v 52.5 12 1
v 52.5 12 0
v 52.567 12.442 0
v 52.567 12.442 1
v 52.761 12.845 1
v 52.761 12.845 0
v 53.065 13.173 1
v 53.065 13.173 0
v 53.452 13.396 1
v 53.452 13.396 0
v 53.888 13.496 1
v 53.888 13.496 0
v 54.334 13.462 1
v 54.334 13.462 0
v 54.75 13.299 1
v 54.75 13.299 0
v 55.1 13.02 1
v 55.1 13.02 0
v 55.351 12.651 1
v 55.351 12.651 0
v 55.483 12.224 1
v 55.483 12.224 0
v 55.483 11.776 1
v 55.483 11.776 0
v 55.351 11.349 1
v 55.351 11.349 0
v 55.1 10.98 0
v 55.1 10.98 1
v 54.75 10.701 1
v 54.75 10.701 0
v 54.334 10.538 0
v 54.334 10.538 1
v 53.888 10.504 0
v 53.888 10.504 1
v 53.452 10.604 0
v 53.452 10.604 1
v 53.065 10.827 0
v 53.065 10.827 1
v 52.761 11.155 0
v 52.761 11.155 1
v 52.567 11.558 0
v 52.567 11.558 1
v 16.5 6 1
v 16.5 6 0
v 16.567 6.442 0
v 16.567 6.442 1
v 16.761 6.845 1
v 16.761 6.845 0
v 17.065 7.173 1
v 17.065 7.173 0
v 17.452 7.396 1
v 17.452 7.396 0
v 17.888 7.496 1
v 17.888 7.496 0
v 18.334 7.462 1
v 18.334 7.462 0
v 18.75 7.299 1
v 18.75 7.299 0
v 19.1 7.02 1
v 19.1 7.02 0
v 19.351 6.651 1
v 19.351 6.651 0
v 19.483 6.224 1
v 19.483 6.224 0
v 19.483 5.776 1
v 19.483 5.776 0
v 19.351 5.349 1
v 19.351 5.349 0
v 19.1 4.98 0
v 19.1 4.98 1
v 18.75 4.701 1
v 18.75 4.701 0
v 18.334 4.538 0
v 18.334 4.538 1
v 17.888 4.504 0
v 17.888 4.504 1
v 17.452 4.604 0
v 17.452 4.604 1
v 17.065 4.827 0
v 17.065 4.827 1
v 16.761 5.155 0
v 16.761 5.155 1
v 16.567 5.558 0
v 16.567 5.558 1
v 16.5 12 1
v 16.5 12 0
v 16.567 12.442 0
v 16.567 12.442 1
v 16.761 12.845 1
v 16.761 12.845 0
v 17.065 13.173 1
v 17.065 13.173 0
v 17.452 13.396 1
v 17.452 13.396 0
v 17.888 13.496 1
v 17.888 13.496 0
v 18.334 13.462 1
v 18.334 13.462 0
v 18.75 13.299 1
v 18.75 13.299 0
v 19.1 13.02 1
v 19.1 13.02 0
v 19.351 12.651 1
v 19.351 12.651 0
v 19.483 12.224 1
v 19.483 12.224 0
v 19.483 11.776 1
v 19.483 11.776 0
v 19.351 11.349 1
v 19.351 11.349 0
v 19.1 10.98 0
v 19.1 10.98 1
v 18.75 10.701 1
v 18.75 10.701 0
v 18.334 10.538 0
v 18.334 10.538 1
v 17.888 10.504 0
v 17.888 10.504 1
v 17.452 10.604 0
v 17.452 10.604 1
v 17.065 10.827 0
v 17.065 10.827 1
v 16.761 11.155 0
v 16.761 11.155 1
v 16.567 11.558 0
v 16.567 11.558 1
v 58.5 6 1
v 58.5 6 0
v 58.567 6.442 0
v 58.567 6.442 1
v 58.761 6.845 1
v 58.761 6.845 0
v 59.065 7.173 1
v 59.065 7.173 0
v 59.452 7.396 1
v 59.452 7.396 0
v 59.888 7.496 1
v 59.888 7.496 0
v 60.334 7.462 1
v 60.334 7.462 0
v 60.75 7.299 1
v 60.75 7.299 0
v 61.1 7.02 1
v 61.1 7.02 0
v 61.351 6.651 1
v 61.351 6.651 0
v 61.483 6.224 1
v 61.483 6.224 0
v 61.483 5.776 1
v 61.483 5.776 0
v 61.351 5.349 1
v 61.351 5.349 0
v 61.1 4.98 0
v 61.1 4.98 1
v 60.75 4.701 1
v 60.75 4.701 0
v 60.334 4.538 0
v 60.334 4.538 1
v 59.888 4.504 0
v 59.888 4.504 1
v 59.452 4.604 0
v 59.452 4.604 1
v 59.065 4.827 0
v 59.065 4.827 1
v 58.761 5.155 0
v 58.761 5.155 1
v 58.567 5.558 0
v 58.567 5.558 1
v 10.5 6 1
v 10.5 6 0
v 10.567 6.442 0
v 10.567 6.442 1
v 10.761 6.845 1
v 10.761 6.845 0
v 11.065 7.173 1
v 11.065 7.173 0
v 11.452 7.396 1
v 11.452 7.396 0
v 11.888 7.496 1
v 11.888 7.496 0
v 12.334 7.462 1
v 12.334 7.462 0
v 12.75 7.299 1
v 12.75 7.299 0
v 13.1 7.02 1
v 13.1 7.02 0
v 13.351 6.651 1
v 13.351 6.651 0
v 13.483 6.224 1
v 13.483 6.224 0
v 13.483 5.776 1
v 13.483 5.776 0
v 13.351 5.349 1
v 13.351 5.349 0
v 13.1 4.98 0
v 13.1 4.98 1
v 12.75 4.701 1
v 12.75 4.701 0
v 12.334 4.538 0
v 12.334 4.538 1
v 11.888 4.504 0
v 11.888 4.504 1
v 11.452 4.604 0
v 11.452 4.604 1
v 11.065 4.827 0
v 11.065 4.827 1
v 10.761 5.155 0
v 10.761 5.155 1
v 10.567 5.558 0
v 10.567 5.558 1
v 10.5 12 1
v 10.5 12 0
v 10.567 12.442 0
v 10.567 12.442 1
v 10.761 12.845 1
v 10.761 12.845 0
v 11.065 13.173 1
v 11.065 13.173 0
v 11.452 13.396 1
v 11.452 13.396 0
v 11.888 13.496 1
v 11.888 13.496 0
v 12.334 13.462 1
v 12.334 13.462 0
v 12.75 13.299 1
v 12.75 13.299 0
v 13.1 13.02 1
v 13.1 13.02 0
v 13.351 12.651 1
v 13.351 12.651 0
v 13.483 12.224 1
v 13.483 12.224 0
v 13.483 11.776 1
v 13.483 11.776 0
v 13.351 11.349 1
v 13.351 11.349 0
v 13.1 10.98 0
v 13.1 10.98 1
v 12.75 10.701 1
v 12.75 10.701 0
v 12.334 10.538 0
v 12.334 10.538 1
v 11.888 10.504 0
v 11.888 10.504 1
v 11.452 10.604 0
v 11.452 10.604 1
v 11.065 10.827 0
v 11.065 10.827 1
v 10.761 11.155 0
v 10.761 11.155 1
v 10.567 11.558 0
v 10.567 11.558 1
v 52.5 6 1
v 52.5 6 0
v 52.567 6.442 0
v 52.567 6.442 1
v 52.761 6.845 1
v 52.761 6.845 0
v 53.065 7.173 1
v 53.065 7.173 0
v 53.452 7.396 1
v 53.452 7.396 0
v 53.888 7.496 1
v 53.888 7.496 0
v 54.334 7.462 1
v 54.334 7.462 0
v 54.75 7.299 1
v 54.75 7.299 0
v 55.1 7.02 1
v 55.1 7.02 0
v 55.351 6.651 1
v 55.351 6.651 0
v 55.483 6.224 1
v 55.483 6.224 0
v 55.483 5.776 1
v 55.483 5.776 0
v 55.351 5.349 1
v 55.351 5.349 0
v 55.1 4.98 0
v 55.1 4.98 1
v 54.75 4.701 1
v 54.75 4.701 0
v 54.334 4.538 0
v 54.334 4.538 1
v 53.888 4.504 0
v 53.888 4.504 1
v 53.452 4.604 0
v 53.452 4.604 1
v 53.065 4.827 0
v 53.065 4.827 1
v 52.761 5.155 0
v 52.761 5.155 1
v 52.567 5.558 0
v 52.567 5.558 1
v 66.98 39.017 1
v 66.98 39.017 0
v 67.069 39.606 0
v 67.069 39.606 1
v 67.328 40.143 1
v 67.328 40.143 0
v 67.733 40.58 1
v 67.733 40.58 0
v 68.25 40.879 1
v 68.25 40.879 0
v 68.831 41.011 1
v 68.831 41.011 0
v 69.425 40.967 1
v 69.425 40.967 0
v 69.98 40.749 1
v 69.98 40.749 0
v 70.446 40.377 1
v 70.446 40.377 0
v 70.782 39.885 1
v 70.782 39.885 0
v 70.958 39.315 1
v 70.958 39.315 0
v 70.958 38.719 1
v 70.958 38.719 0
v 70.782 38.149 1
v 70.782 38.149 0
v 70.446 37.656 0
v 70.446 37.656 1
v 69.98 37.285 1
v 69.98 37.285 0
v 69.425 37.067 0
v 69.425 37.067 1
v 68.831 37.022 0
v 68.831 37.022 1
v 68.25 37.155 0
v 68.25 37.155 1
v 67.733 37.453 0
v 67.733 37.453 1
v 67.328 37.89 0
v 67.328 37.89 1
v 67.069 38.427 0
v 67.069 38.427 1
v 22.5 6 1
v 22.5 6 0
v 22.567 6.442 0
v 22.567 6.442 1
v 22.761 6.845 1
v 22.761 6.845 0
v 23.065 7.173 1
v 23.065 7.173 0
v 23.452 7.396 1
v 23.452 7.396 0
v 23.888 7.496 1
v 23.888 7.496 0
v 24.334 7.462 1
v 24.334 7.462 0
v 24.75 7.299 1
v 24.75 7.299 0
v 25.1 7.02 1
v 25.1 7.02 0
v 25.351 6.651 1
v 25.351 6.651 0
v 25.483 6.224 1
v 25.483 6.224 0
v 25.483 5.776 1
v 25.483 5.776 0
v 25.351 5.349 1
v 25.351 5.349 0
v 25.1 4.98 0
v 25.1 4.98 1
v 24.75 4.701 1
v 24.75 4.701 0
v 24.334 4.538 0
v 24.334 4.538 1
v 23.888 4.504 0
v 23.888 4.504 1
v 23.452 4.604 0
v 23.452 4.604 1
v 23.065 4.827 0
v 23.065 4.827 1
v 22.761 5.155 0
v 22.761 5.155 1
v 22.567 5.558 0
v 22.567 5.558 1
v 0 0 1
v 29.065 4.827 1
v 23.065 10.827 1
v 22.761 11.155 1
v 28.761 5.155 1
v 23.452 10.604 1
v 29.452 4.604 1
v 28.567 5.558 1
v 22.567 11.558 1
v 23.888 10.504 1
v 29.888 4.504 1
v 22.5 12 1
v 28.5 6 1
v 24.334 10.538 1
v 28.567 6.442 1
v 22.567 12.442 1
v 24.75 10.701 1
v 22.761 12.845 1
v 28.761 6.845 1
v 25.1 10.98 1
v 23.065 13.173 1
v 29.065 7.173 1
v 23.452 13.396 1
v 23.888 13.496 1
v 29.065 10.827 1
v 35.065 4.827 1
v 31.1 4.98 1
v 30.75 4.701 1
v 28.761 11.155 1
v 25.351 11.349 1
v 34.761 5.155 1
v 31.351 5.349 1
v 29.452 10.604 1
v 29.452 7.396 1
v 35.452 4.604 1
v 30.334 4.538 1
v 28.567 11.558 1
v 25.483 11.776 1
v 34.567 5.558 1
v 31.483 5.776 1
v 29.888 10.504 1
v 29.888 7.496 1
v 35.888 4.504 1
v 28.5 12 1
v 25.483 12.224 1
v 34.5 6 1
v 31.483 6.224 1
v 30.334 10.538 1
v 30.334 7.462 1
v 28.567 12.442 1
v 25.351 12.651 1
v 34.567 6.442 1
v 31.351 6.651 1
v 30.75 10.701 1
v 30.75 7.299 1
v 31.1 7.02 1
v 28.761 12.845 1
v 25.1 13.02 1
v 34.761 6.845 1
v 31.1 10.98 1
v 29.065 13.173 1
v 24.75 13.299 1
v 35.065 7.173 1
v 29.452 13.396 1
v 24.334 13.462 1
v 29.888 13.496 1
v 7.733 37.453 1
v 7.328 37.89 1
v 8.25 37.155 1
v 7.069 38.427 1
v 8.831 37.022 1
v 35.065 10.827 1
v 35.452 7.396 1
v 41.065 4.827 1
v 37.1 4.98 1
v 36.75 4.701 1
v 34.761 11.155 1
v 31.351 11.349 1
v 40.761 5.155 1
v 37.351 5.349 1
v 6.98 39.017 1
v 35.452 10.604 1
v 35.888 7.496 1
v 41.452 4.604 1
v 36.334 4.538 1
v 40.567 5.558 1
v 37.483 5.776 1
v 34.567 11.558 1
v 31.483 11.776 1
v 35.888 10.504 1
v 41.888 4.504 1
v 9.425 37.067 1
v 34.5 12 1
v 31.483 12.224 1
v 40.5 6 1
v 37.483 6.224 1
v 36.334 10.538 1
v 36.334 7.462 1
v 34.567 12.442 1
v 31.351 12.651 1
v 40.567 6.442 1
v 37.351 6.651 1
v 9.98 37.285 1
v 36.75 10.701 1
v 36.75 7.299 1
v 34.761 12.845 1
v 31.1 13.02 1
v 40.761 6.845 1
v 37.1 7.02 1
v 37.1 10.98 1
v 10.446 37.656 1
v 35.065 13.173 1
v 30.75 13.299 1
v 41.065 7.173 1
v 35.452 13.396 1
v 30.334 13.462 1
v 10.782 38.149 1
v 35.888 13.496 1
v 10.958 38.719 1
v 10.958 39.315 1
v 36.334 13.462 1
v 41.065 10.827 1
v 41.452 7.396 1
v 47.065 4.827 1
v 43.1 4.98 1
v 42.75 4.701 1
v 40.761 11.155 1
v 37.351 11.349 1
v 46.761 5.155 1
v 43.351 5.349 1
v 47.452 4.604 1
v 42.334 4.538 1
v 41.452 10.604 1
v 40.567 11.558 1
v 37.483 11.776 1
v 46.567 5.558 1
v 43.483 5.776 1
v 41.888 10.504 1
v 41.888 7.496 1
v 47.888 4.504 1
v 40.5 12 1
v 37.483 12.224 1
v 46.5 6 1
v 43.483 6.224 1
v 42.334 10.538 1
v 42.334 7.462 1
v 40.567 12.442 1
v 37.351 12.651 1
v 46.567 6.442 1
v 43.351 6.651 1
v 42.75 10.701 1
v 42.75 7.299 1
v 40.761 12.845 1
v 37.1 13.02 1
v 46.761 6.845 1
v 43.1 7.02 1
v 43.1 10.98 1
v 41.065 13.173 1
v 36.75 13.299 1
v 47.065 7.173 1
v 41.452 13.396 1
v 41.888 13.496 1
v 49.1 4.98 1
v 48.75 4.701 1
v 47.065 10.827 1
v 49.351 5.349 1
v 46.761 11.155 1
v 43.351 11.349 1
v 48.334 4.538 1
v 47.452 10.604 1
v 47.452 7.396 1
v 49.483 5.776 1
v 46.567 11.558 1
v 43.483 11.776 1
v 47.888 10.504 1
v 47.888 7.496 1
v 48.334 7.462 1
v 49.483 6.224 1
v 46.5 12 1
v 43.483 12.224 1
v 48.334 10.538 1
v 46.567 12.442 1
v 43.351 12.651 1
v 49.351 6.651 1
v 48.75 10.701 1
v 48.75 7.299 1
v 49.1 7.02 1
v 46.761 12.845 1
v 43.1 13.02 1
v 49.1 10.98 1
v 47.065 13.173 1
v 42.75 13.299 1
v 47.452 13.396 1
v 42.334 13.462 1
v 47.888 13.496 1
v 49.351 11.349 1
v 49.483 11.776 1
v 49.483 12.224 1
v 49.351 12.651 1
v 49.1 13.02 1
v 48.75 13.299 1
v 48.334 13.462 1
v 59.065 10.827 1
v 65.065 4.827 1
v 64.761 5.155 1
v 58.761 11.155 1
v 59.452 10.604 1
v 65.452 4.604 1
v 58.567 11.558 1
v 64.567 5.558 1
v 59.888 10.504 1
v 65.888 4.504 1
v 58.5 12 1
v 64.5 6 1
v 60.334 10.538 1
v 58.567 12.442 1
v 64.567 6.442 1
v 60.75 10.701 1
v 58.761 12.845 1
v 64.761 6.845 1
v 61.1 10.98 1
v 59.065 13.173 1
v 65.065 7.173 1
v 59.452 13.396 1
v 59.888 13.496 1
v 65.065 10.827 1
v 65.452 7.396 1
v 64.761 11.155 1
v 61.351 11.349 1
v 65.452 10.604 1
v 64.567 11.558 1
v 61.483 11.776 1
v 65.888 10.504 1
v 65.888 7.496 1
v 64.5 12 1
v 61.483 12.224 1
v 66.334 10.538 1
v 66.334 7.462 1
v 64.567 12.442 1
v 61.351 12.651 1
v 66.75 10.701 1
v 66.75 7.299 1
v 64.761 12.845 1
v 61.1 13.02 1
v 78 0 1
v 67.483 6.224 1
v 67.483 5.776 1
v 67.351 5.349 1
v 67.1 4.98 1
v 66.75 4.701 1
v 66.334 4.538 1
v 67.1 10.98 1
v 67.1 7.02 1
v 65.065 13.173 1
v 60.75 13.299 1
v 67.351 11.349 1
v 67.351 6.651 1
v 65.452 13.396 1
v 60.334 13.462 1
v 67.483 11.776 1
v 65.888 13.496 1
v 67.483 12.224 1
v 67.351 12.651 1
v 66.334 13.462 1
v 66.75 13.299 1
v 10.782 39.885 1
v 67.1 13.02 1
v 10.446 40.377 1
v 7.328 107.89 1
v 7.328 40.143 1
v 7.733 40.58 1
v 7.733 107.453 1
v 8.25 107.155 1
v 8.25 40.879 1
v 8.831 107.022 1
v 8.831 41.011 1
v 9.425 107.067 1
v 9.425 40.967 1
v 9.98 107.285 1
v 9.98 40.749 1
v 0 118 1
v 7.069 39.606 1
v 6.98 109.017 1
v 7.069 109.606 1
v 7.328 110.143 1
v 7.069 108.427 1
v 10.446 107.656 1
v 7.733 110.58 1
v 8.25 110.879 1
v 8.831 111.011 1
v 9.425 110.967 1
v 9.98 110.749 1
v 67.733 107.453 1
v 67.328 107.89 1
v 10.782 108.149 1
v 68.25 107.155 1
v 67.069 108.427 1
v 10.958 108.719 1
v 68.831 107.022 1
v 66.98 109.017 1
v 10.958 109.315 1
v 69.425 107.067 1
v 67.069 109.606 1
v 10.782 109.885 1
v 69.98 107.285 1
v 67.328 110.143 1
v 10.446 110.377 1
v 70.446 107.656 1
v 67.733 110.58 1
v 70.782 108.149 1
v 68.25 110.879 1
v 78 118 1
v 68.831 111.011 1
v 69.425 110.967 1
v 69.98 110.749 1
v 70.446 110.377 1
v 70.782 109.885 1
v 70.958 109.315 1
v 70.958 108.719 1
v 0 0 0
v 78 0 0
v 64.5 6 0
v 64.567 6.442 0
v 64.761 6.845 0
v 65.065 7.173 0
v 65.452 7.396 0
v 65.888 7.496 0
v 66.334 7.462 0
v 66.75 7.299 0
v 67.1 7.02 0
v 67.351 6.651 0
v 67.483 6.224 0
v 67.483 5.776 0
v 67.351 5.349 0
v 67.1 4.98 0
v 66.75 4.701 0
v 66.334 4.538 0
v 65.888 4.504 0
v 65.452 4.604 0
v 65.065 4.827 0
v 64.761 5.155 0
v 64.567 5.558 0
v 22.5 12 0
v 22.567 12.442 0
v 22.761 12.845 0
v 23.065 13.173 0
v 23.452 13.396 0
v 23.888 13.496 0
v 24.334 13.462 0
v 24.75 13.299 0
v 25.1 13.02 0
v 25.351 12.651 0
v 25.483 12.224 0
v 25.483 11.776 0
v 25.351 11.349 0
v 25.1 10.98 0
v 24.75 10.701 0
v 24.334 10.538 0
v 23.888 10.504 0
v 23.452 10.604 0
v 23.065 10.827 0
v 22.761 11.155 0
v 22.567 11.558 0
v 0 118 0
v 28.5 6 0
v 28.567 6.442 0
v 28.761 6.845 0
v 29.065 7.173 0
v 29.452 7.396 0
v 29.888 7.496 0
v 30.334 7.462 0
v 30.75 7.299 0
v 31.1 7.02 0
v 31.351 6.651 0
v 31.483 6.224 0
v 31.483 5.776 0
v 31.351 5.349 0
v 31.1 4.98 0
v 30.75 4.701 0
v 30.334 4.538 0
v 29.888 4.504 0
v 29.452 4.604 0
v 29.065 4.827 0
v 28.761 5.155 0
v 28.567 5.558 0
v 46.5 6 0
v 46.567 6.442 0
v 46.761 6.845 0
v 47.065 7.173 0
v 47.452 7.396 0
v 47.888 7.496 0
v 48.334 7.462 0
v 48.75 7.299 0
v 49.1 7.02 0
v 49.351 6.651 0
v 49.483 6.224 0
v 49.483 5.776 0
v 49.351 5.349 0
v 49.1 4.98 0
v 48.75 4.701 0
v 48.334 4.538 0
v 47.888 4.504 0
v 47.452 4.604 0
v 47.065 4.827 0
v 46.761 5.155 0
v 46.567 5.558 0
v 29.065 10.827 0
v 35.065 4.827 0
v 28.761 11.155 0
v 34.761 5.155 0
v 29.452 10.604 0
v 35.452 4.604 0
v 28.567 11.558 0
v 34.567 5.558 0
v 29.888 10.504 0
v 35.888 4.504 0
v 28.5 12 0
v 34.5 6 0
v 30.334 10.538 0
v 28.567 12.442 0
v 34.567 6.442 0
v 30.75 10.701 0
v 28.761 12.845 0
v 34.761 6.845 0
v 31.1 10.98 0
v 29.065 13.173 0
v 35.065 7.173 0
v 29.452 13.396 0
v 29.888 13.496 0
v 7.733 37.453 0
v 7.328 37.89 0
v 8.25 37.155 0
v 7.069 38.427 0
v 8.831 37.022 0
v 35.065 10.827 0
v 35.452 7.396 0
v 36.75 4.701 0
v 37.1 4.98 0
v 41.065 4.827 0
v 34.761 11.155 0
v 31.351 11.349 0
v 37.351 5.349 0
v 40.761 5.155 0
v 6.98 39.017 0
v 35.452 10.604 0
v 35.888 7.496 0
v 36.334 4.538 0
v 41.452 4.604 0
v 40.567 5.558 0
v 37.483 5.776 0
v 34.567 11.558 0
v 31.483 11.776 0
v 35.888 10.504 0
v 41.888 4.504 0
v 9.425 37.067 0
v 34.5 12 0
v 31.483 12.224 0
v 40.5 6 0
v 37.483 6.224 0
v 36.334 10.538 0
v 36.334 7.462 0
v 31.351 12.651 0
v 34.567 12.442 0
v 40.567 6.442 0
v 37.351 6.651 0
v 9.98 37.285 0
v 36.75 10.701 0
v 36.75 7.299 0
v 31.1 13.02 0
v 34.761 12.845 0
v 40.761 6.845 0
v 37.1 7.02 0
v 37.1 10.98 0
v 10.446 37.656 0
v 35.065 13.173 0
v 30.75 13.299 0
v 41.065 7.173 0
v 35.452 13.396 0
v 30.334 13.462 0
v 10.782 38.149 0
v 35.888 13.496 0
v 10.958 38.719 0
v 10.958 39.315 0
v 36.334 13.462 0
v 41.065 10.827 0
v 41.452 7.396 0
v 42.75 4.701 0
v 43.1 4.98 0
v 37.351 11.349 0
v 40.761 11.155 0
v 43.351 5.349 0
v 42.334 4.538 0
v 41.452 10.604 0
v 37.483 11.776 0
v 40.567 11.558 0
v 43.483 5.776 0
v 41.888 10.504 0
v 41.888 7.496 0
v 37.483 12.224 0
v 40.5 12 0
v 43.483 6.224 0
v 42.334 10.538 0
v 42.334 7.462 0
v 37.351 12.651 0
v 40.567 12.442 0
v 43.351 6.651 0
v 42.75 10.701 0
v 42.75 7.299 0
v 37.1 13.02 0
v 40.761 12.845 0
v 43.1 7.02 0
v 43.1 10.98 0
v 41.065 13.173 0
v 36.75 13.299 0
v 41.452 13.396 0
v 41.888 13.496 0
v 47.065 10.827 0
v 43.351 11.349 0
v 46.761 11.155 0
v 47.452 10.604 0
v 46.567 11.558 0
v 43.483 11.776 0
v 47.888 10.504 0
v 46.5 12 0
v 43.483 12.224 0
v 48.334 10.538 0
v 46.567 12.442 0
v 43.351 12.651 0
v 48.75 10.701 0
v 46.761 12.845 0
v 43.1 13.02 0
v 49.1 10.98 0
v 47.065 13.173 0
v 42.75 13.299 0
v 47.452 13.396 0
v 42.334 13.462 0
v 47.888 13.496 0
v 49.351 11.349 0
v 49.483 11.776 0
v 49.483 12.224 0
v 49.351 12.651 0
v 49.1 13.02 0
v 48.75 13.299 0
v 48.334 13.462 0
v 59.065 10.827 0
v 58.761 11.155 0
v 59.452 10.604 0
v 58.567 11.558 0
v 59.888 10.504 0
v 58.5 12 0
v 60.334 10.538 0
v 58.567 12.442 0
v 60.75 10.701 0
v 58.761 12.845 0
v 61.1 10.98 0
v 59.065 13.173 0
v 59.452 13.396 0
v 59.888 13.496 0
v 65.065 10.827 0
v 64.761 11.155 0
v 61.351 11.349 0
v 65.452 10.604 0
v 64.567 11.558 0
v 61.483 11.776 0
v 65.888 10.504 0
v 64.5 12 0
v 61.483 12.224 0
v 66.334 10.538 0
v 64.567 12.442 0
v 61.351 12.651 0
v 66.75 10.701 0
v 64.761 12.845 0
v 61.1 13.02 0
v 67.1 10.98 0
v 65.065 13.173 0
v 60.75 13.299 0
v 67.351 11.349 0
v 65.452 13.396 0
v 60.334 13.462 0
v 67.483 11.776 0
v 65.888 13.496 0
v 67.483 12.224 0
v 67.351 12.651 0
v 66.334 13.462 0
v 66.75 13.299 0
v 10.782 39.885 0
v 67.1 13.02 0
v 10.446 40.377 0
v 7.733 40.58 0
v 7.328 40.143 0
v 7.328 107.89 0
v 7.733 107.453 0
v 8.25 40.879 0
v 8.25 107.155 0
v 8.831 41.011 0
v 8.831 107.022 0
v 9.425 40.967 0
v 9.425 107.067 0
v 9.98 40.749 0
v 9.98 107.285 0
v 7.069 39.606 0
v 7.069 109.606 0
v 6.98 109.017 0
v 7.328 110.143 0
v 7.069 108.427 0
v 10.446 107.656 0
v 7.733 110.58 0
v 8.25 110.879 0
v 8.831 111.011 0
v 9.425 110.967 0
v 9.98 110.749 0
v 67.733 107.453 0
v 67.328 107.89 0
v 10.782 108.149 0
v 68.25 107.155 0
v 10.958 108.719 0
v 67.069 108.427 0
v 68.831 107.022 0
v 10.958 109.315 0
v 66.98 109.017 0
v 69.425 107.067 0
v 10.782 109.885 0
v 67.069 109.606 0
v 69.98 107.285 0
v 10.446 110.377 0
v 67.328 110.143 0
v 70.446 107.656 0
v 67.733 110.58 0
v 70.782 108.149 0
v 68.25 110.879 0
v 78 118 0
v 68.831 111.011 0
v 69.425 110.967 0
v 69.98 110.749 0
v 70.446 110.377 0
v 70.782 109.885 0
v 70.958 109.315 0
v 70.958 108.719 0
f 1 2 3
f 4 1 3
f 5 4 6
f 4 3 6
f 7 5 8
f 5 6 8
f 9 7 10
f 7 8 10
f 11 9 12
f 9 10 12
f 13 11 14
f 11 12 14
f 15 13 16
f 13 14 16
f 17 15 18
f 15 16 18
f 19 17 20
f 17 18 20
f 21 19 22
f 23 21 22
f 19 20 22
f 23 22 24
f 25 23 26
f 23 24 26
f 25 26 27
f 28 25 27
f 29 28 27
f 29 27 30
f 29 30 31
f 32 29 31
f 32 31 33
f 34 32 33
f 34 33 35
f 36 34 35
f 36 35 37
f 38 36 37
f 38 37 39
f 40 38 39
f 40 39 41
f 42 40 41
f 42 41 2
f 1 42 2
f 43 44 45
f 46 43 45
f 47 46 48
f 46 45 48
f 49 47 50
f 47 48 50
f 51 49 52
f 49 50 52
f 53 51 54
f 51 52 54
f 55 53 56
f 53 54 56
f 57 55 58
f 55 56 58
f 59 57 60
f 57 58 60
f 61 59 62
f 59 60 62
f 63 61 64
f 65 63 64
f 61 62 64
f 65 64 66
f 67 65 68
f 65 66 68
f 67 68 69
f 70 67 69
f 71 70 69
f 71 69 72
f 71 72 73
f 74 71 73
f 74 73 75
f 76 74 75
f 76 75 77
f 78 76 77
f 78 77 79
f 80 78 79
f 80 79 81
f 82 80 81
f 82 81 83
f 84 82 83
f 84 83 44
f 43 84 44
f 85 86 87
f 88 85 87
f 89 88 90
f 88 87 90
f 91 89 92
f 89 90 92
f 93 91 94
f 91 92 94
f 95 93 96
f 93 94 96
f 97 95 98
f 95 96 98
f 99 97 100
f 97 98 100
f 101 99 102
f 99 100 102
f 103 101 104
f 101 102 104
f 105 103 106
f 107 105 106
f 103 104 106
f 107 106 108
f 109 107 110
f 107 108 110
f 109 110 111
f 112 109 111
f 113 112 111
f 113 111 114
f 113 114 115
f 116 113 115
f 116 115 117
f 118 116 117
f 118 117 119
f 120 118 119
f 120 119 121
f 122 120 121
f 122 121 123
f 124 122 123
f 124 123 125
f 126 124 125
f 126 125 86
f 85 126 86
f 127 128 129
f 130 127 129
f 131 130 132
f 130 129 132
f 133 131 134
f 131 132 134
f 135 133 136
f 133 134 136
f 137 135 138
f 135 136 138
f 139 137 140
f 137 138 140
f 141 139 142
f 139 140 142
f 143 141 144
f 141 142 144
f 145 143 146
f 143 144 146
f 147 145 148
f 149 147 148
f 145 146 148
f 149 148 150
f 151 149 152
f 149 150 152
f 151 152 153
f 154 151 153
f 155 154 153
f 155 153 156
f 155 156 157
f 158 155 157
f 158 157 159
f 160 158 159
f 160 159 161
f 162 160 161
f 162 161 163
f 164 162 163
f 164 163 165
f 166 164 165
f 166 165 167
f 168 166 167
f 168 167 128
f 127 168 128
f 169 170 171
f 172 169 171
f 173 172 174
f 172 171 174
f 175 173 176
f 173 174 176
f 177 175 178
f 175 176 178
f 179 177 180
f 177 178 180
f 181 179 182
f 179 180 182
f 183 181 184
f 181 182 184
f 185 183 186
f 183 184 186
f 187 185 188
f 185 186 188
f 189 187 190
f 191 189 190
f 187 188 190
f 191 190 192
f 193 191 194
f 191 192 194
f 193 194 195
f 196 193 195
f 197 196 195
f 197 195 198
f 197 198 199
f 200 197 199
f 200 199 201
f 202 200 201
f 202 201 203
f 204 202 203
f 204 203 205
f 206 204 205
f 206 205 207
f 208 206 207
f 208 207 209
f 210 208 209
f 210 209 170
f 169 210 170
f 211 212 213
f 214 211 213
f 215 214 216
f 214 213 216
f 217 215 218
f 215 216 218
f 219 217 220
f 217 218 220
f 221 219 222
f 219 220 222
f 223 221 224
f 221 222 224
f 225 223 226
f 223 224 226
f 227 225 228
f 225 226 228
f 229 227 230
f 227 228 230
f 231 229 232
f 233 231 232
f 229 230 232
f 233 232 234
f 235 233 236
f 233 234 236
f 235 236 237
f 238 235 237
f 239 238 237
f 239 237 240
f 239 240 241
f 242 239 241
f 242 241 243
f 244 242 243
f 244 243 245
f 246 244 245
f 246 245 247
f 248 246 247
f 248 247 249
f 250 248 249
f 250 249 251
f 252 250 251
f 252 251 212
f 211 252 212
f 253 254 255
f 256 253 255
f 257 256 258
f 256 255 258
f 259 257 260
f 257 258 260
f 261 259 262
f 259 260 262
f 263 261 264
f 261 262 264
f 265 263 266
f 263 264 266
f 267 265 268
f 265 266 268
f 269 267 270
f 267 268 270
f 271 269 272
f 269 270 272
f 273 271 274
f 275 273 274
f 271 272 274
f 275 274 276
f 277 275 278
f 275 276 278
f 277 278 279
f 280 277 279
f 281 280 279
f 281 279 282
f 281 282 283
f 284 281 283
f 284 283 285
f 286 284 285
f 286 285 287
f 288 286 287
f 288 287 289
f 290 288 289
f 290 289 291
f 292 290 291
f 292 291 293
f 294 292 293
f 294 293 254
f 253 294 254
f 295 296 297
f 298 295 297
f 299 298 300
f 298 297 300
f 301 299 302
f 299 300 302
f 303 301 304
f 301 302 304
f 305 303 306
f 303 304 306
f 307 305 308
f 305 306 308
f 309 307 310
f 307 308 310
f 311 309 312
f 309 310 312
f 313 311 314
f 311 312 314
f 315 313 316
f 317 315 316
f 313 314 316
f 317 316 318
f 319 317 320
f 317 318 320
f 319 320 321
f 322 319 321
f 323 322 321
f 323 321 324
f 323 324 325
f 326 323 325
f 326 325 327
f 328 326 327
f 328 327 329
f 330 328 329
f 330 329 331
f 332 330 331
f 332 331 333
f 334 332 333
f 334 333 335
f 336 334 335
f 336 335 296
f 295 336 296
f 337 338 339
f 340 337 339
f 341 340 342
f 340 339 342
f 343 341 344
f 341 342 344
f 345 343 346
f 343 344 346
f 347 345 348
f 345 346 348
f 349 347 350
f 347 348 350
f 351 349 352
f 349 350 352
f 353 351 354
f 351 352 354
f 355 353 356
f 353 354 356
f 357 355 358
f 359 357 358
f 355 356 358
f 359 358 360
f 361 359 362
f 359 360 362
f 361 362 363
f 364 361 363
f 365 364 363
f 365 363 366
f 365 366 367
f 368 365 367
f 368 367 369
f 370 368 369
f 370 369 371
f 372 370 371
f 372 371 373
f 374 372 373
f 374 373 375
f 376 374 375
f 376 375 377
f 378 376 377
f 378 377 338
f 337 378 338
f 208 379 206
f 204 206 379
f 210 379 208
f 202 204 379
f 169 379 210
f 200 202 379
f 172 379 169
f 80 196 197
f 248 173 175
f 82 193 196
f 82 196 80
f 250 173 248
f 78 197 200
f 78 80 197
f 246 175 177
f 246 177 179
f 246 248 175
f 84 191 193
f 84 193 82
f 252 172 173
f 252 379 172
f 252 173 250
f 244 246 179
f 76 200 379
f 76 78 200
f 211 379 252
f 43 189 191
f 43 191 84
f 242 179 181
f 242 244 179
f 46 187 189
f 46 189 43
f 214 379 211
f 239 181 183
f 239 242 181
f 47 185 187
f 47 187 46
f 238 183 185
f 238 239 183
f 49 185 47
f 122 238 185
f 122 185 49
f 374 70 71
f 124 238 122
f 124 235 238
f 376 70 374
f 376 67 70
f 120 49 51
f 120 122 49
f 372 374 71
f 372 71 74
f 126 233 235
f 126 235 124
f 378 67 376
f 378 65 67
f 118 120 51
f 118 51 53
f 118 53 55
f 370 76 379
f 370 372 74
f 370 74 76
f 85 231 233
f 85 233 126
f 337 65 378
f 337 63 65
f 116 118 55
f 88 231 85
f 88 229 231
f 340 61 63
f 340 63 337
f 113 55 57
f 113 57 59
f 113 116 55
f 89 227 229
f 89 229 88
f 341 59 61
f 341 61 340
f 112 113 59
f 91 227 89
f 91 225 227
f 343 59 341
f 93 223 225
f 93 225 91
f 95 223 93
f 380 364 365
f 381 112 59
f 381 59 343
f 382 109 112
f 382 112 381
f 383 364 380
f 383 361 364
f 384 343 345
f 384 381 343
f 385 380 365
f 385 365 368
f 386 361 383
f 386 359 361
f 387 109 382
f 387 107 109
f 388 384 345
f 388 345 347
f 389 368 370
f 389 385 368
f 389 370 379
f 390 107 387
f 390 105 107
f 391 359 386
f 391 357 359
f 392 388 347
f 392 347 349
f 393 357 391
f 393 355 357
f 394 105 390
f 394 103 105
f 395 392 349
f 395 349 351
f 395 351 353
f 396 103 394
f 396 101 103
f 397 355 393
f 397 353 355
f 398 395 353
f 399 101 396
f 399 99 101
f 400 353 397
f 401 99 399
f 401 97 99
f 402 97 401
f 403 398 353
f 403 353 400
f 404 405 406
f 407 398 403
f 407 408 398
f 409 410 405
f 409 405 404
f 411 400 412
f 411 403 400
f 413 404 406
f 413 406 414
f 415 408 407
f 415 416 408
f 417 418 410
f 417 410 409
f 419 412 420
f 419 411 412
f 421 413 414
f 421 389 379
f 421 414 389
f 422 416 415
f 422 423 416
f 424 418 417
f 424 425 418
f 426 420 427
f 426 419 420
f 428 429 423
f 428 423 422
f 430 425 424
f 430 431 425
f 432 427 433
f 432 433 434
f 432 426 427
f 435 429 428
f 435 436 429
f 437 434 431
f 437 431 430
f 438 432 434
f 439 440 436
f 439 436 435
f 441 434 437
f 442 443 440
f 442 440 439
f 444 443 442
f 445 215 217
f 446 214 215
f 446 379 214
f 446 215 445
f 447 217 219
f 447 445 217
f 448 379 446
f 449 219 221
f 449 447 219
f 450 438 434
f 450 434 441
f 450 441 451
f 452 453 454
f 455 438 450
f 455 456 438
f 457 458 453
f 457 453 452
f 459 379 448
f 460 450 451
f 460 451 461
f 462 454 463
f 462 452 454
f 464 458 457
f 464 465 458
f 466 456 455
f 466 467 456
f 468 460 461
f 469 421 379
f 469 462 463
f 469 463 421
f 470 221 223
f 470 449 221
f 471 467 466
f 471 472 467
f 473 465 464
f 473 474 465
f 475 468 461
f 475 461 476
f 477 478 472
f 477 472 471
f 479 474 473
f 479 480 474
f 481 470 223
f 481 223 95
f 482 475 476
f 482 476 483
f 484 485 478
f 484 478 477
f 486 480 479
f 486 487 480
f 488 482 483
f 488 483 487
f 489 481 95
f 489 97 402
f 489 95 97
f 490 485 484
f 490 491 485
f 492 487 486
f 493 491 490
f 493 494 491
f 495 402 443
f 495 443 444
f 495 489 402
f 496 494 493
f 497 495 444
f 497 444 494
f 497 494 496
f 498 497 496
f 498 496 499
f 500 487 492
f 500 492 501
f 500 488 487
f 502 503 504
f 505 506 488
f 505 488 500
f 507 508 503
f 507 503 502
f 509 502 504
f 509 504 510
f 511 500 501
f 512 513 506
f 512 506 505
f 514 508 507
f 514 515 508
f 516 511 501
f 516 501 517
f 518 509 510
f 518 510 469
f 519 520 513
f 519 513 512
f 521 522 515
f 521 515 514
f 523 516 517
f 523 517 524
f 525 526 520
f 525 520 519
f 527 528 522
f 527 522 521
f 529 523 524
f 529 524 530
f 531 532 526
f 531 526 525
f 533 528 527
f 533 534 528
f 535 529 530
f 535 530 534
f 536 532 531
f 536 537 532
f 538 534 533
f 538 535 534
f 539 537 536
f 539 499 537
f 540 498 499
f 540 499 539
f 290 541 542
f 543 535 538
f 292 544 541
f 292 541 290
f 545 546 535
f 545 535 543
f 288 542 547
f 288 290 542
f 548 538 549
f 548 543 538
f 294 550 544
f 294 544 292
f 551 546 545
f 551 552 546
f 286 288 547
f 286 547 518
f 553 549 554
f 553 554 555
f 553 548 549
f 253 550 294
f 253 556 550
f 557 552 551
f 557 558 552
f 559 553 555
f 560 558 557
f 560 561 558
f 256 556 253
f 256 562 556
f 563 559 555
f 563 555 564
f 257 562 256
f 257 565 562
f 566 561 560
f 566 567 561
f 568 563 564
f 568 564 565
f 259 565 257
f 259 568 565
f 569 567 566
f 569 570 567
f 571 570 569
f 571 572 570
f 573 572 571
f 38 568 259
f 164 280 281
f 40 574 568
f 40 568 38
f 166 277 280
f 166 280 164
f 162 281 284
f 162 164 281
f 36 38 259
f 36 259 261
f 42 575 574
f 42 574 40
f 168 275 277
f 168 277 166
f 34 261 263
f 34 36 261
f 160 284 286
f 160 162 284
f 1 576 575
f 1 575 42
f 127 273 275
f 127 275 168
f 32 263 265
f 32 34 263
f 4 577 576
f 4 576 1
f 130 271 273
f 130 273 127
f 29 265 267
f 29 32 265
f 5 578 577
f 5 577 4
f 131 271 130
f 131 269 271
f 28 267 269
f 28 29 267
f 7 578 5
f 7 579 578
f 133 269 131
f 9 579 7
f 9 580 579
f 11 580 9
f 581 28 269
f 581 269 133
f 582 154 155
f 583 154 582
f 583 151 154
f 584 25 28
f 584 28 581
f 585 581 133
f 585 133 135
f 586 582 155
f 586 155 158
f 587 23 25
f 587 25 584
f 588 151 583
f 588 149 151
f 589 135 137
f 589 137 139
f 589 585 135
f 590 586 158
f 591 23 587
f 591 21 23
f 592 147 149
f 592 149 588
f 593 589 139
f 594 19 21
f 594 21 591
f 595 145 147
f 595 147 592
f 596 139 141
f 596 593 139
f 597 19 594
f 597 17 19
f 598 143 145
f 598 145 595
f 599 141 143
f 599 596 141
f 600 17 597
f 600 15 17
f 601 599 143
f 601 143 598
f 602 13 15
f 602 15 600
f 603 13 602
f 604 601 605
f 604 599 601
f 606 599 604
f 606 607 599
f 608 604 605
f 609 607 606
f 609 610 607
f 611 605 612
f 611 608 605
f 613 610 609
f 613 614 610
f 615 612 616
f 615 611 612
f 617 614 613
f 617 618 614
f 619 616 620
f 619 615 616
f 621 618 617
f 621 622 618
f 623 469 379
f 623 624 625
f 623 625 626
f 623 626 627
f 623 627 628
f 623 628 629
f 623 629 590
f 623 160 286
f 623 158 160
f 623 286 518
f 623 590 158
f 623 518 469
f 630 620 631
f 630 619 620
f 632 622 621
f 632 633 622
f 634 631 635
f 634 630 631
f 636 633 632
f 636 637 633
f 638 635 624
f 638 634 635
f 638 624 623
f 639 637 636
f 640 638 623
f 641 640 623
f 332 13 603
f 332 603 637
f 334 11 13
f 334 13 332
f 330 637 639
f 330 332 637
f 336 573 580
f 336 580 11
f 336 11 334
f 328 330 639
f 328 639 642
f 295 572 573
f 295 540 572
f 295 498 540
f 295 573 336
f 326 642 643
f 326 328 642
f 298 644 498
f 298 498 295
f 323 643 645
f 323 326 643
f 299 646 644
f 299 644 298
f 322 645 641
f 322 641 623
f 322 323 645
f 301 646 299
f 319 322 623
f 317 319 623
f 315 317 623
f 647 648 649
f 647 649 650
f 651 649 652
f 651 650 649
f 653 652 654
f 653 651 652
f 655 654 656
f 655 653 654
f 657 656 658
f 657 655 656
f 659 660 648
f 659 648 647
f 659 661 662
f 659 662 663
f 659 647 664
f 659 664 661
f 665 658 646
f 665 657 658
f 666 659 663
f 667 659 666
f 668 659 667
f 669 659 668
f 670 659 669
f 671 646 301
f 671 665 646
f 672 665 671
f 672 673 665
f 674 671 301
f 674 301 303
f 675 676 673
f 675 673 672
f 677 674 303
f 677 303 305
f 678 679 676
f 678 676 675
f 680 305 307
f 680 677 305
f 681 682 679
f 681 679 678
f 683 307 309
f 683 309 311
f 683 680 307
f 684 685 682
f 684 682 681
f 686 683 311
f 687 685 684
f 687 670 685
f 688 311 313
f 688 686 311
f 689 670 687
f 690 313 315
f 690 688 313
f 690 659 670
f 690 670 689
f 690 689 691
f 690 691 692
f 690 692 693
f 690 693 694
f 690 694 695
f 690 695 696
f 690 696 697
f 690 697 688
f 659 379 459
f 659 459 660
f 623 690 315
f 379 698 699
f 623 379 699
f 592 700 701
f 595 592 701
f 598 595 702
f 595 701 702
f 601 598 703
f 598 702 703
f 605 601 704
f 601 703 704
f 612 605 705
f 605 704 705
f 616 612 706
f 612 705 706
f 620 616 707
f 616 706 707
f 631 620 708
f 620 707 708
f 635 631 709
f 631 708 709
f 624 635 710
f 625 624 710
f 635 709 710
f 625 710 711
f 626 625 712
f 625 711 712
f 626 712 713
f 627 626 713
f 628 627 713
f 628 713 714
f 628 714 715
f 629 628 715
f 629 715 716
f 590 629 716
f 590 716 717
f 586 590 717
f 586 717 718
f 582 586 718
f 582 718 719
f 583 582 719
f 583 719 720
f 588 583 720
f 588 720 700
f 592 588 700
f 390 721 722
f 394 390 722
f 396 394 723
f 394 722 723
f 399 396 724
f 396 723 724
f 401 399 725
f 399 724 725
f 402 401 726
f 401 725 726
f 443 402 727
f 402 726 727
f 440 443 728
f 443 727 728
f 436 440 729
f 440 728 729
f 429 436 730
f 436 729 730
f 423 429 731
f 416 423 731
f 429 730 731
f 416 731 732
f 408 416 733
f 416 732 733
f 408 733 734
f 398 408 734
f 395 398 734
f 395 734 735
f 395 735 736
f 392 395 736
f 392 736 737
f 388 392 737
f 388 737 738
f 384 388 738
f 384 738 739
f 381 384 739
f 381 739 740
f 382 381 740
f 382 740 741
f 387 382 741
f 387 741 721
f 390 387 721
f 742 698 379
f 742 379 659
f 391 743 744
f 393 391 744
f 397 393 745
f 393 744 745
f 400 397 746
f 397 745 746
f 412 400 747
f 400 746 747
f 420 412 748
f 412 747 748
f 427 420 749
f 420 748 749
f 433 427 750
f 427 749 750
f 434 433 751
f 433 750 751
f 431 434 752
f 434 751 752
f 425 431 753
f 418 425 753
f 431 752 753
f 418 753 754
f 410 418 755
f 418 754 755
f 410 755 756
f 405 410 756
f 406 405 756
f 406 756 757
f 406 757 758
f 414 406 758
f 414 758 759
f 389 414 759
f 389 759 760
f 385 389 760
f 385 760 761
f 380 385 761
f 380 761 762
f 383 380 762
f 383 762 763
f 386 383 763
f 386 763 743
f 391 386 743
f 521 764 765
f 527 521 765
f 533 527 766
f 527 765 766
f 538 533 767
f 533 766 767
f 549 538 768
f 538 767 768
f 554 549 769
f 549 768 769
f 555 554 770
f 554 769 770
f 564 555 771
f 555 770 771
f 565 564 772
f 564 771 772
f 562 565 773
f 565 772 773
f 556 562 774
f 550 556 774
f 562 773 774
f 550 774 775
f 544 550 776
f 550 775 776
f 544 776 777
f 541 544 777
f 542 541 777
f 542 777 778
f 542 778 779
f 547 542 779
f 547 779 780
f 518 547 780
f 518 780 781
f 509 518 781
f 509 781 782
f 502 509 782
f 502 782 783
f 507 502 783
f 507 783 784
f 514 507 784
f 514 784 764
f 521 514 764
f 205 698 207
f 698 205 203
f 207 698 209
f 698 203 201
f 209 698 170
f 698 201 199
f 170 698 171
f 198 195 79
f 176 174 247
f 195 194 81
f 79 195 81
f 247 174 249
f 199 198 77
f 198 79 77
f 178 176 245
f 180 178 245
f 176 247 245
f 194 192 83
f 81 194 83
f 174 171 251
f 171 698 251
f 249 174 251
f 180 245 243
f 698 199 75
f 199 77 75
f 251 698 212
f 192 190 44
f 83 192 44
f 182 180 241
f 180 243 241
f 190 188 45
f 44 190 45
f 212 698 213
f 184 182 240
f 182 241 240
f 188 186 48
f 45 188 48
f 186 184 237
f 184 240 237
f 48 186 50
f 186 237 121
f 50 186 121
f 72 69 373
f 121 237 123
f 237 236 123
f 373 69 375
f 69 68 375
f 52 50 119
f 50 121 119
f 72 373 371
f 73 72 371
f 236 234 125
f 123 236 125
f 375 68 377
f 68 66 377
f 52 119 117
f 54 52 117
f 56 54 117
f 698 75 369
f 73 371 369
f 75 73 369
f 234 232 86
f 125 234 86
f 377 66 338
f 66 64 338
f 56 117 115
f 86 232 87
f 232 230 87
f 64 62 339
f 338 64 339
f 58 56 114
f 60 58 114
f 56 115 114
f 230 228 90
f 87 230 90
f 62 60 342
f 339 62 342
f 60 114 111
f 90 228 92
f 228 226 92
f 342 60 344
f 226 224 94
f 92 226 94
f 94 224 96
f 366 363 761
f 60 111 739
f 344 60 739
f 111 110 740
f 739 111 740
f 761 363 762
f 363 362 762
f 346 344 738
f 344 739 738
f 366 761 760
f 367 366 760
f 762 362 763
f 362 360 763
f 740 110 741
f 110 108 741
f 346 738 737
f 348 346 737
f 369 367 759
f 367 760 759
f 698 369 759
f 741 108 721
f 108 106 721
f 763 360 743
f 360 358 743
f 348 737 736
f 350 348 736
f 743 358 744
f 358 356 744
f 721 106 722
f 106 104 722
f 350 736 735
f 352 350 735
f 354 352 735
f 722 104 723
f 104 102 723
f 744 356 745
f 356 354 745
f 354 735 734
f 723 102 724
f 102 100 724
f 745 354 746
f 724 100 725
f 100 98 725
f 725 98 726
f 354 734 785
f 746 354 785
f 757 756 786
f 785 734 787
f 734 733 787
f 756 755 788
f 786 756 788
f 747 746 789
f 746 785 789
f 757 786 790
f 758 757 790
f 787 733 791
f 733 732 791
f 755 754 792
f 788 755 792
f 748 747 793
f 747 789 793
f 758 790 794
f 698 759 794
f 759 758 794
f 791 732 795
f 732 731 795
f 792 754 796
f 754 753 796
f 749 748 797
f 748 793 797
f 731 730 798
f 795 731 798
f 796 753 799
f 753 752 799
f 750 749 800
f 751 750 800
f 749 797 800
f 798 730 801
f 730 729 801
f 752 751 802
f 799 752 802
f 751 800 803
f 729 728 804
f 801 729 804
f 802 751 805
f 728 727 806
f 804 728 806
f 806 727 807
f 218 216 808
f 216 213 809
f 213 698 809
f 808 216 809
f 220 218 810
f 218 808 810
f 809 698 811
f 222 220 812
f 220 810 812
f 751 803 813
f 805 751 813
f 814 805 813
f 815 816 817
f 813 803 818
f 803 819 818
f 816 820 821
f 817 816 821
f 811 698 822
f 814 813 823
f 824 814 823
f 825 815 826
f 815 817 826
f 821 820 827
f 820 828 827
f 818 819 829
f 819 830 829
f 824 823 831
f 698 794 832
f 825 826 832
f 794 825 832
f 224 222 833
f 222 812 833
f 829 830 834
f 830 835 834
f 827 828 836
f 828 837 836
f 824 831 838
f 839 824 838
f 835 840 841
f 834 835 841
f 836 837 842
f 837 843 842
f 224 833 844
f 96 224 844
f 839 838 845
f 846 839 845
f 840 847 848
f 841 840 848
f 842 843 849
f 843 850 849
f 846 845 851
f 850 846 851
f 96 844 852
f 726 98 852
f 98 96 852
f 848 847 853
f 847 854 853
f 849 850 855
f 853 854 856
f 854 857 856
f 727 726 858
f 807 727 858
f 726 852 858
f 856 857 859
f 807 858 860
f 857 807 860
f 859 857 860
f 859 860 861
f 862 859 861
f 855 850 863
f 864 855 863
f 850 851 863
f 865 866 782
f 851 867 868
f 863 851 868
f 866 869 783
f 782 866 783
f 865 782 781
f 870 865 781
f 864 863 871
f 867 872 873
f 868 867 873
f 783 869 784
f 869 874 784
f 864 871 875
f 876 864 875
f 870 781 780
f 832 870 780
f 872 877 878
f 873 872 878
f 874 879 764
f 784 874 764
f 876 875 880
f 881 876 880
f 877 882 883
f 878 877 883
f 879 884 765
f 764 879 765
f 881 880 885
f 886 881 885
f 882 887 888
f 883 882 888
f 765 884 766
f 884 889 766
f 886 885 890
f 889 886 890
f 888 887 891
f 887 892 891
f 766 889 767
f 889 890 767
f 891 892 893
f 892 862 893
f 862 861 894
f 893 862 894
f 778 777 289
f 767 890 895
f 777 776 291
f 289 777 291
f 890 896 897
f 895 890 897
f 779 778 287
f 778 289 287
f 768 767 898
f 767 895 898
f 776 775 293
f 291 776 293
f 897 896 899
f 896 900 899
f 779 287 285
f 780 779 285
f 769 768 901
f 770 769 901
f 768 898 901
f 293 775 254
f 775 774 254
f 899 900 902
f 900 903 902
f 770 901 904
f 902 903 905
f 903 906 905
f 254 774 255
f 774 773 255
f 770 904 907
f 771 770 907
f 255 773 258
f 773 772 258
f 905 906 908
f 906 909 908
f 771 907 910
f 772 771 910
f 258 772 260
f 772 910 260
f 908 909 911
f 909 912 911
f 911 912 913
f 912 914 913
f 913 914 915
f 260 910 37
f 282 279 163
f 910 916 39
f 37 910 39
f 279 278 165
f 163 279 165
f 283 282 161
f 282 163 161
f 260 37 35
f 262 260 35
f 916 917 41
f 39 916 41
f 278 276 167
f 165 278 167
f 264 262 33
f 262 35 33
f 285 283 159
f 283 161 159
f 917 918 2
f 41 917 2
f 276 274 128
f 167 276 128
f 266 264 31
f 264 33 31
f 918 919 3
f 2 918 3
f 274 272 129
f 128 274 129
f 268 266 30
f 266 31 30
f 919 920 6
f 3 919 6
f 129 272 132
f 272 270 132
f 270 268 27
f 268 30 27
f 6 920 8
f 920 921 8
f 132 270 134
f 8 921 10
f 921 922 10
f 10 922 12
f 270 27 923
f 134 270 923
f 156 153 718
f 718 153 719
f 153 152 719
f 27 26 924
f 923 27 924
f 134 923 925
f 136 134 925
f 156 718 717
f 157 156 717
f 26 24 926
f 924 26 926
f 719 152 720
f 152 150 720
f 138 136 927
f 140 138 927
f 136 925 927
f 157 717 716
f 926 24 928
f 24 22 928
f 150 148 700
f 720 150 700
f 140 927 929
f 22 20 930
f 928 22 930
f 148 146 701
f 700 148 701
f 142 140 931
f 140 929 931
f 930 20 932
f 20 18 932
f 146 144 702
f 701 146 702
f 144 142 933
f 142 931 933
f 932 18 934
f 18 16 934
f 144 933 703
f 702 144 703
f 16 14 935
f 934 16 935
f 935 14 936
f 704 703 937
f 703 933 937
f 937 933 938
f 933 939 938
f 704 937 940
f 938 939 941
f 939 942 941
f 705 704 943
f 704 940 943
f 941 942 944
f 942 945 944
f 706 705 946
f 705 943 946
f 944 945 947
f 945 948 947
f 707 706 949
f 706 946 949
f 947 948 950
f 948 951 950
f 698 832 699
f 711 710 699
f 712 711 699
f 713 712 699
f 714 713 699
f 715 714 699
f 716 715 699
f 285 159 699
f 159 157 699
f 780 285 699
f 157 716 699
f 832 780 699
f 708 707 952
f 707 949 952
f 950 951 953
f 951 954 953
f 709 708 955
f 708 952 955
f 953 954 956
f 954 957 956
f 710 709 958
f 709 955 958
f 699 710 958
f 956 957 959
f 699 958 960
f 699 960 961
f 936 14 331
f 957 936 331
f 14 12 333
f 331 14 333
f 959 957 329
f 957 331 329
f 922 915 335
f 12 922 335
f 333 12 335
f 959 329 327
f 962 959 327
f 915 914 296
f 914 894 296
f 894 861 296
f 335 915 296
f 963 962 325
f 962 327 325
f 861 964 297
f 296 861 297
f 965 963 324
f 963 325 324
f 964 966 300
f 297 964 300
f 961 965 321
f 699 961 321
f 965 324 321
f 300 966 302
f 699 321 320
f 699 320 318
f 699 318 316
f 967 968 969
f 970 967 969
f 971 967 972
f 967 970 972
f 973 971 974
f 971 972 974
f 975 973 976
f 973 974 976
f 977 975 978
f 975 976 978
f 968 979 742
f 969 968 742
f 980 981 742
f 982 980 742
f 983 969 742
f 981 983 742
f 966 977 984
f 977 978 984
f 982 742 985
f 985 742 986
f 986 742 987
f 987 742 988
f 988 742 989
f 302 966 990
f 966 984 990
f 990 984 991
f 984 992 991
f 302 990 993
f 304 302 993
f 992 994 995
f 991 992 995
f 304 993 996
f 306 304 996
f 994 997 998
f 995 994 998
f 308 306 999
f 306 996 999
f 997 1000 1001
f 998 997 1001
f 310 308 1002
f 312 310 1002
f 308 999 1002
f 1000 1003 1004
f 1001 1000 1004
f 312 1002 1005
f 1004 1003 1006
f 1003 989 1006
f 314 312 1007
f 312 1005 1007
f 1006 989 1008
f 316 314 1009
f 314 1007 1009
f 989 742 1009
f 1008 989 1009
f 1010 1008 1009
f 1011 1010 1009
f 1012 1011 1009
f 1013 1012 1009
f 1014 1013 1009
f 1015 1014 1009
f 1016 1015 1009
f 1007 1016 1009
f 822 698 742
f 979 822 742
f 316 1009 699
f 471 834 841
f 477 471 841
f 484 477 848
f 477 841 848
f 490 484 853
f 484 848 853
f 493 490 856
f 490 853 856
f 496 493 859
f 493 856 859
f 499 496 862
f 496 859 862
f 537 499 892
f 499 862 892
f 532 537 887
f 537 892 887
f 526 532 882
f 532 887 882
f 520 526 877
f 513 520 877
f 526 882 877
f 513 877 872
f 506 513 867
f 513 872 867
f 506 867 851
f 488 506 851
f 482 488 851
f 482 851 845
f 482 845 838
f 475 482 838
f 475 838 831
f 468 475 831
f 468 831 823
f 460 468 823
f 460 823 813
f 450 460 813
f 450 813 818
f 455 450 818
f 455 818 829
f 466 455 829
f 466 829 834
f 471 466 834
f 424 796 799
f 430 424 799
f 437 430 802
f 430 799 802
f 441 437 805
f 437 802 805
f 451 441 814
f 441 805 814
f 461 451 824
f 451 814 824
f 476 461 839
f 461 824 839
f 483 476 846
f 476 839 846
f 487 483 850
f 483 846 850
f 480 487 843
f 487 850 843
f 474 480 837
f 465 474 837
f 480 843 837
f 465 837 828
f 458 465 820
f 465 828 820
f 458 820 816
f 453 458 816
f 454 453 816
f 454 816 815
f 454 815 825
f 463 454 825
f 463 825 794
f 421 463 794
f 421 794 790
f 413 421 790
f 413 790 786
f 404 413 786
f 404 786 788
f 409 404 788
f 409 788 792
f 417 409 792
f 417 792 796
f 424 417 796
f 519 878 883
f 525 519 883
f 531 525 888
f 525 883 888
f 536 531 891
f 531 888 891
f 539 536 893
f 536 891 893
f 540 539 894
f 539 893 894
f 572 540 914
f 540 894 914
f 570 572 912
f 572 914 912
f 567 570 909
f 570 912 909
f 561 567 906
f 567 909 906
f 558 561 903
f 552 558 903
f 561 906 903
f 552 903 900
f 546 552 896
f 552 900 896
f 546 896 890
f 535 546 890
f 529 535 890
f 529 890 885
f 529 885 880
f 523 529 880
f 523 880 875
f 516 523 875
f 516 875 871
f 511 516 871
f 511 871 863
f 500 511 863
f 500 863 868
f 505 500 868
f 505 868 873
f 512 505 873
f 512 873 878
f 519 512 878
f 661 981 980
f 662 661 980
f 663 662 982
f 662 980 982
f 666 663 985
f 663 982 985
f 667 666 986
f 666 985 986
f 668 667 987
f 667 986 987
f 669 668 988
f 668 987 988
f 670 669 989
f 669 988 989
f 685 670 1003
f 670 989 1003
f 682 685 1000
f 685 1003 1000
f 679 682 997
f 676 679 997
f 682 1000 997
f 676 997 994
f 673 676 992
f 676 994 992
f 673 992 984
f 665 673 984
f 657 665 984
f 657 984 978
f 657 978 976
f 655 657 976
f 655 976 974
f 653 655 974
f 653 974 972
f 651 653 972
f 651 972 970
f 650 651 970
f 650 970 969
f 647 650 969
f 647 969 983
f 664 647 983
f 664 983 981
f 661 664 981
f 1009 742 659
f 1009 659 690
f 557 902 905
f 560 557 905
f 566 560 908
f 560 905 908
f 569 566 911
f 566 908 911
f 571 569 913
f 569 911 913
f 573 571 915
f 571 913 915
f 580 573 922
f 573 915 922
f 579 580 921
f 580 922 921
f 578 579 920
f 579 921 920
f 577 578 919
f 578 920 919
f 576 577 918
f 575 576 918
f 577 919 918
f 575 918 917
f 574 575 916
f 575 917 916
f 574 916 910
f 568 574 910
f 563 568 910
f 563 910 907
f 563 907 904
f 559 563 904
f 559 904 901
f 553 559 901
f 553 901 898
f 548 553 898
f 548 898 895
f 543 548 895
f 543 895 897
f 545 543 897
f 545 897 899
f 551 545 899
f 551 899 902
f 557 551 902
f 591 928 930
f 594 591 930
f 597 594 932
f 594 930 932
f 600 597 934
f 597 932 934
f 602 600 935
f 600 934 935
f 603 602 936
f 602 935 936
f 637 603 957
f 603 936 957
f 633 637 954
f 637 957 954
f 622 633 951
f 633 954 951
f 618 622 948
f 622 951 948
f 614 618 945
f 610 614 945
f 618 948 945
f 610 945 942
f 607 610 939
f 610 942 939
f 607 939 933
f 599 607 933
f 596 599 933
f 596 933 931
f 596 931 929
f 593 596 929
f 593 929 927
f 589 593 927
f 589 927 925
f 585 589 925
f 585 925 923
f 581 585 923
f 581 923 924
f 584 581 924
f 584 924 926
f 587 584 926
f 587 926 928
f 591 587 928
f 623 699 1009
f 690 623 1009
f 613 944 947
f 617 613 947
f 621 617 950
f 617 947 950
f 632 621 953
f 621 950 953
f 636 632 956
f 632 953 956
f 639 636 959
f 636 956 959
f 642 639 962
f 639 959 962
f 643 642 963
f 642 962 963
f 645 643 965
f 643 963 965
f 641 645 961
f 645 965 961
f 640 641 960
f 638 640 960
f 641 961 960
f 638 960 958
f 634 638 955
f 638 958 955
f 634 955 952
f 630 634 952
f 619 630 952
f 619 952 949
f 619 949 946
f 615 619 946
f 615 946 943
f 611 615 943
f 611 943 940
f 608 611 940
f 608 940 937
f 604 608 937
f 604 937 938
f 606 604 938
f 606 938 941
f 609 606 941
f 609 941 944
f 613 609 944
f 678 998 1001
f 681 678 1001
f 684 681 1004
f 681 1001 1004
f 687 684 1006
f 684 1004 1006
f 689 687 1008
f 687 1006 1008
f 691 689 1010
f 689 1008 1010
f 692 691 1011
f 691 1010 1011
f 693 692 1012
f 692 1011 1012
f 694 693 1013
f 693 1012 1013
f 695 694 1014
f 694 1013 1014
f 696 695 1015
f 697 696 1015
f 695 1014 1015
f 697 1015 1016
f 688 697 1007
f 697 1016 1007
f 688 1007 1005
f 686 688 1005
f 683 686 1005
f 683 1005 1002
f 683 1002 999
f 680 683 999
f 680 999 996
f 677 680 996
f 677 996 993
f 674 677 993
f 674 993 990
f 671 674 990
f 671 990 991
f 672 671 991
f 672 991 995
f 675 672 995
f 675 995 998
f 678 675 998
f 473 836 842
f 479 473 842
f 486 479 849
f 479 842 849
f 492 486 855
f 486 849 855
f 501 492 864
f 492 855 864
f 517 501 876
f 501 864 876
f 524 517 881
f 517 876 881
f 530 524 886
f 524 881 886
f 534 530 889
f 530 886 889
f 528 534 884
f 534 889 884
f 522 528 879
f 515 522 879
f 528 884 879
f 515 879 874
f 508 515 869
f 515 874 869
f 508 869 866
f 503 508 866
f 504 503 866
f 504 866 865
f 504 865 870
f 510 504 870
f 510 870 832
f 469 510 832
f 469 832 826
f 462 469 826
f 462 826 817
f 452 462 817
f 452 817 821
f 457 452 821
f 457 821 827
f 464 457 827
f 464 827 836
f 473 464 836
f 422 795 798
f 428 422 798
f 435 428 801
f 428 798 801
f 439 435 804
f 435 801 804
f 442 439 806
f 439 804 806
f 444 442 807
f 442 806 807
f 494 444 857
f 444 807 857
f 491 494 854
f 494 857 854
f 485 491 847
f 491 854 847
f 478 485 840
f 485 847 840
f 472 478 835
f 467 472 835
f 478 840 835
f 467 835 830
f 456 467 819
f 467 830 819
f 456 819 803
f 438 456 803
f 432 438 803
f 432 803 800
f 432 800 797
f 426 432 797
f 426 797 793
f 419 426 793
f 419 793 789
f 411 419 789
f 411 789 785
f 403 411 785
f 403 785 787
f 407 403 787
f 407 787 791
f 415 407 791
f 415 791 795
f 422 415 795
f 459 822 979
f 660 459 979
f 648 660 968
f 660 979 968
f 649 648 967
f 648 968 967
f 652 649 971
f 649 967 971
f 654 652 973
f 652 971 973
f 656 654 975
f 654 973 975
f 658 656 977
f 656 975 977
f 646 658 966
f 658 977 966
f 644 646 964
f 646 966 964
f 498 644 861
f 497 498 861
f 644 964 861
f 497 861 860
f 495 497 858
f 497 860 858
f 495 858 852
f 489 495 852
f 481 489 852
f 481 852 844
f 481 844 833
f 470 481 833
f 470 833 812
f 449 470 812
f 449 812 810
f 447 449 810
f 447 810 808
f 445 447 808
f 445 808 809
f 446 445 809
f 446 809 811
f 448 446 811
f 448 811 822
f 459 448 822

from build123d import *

# Parameters (mm, degrees)
SKETCH1_W           = 78
SKETCH1_H           = 118
BOSS_EXTRUDE1_DEPTH = 1
SKETCH2_R           = 2
SKETCH2_R_2         = 1.5
CUT_EXTRUDE1_DEPTH  = 142.453172464


with BuildPart() as part:
    # Sketch1 → Boss-Extrude1 (new body)
    with BuildSketch(Plane.XY):
        with Locations((39, 59)):
            Rectangle(SKETCH1_W, SKETCH1_H)
    extrude(amount=BOSS_EXTRUDE1_DEPTH)

    # Sketch2 → Cut-Extrude1 (cut, through all)
    with BuildSketch(Plane(origin=(0, 0, 0), x_dir=(-1, 0, 0), z_dir=(0, 0, -1))):
        with Locations((-8.980393049, 39.016810723)):
            Circle(SKETCH2_R)
        with Locations((-68.980393049, 39.016810723)):
            Circle(SKETCH2_R)
        with Locations((-68.980393049, 109.016810723)):
            Circle(SKETCH2_R)
        with Locations((-8.980393049, 109.016810723)):
            Circle(SKETCH2_R)
        with Locations((-66, 12)):
            Circle(SKETCH2_R_2)
        with Locations((-60, 12)):
            Circle(SKETCH2_R_2)
        with Locations((-54, 12)):
            Circle(SKETCH2_R_2)
        with Locations((-48, 12)):
            Circle(SKETCH2_R_2)
        with Locations((-42, 12)):
            Circle(SKETCH2_R_2)
        with Locations((-36, 12)):
            Circle(SKETCH2_R_2)
        with Locations((-30, 12)):
            Circle(SKETCH2_R_2)
        with Locations((-24, 12)):
            Circle(SKETCH2_R_2)
        with Locations((-18, 12)):
            Circle(SKETCH2_R_2)
        with Locations((-12, 12)):
            Circle(SKETCH2_R_2)
        with Locations((-60, 6)):
            Circle(SKETCH2_R_2)
        with Locations((-54, 6)):
            Circle(SKETCH2_R_2)
        with Locations((-48, 6)):
            Circle(SKETCH2_R_2)
        with Locations((-42, 6)):
            Circle(SKETCH2_R_2)
        with Locations((-36, 6)):
            Circle(SKETCH2_R_2)
        with Locations((-30, 6)):
            Circle(SKETCH2_R_2)
        with Locations((-24, 6)):
            Circle(SKETCH2_R_2)
        with Locations((-18, 6)):
            Circle(SKETCH2_R_2)
        with Locations((-12, 6)):
            Circle(SKETCH2_R_2)
        with Locations((-66, 6)):
            Circle(SKETCH2_R_2)
    extrude(amount=-CUT_EXTRUDE1_DEPTH, mode=Mode.SUBTRACT)


solid = part.part
